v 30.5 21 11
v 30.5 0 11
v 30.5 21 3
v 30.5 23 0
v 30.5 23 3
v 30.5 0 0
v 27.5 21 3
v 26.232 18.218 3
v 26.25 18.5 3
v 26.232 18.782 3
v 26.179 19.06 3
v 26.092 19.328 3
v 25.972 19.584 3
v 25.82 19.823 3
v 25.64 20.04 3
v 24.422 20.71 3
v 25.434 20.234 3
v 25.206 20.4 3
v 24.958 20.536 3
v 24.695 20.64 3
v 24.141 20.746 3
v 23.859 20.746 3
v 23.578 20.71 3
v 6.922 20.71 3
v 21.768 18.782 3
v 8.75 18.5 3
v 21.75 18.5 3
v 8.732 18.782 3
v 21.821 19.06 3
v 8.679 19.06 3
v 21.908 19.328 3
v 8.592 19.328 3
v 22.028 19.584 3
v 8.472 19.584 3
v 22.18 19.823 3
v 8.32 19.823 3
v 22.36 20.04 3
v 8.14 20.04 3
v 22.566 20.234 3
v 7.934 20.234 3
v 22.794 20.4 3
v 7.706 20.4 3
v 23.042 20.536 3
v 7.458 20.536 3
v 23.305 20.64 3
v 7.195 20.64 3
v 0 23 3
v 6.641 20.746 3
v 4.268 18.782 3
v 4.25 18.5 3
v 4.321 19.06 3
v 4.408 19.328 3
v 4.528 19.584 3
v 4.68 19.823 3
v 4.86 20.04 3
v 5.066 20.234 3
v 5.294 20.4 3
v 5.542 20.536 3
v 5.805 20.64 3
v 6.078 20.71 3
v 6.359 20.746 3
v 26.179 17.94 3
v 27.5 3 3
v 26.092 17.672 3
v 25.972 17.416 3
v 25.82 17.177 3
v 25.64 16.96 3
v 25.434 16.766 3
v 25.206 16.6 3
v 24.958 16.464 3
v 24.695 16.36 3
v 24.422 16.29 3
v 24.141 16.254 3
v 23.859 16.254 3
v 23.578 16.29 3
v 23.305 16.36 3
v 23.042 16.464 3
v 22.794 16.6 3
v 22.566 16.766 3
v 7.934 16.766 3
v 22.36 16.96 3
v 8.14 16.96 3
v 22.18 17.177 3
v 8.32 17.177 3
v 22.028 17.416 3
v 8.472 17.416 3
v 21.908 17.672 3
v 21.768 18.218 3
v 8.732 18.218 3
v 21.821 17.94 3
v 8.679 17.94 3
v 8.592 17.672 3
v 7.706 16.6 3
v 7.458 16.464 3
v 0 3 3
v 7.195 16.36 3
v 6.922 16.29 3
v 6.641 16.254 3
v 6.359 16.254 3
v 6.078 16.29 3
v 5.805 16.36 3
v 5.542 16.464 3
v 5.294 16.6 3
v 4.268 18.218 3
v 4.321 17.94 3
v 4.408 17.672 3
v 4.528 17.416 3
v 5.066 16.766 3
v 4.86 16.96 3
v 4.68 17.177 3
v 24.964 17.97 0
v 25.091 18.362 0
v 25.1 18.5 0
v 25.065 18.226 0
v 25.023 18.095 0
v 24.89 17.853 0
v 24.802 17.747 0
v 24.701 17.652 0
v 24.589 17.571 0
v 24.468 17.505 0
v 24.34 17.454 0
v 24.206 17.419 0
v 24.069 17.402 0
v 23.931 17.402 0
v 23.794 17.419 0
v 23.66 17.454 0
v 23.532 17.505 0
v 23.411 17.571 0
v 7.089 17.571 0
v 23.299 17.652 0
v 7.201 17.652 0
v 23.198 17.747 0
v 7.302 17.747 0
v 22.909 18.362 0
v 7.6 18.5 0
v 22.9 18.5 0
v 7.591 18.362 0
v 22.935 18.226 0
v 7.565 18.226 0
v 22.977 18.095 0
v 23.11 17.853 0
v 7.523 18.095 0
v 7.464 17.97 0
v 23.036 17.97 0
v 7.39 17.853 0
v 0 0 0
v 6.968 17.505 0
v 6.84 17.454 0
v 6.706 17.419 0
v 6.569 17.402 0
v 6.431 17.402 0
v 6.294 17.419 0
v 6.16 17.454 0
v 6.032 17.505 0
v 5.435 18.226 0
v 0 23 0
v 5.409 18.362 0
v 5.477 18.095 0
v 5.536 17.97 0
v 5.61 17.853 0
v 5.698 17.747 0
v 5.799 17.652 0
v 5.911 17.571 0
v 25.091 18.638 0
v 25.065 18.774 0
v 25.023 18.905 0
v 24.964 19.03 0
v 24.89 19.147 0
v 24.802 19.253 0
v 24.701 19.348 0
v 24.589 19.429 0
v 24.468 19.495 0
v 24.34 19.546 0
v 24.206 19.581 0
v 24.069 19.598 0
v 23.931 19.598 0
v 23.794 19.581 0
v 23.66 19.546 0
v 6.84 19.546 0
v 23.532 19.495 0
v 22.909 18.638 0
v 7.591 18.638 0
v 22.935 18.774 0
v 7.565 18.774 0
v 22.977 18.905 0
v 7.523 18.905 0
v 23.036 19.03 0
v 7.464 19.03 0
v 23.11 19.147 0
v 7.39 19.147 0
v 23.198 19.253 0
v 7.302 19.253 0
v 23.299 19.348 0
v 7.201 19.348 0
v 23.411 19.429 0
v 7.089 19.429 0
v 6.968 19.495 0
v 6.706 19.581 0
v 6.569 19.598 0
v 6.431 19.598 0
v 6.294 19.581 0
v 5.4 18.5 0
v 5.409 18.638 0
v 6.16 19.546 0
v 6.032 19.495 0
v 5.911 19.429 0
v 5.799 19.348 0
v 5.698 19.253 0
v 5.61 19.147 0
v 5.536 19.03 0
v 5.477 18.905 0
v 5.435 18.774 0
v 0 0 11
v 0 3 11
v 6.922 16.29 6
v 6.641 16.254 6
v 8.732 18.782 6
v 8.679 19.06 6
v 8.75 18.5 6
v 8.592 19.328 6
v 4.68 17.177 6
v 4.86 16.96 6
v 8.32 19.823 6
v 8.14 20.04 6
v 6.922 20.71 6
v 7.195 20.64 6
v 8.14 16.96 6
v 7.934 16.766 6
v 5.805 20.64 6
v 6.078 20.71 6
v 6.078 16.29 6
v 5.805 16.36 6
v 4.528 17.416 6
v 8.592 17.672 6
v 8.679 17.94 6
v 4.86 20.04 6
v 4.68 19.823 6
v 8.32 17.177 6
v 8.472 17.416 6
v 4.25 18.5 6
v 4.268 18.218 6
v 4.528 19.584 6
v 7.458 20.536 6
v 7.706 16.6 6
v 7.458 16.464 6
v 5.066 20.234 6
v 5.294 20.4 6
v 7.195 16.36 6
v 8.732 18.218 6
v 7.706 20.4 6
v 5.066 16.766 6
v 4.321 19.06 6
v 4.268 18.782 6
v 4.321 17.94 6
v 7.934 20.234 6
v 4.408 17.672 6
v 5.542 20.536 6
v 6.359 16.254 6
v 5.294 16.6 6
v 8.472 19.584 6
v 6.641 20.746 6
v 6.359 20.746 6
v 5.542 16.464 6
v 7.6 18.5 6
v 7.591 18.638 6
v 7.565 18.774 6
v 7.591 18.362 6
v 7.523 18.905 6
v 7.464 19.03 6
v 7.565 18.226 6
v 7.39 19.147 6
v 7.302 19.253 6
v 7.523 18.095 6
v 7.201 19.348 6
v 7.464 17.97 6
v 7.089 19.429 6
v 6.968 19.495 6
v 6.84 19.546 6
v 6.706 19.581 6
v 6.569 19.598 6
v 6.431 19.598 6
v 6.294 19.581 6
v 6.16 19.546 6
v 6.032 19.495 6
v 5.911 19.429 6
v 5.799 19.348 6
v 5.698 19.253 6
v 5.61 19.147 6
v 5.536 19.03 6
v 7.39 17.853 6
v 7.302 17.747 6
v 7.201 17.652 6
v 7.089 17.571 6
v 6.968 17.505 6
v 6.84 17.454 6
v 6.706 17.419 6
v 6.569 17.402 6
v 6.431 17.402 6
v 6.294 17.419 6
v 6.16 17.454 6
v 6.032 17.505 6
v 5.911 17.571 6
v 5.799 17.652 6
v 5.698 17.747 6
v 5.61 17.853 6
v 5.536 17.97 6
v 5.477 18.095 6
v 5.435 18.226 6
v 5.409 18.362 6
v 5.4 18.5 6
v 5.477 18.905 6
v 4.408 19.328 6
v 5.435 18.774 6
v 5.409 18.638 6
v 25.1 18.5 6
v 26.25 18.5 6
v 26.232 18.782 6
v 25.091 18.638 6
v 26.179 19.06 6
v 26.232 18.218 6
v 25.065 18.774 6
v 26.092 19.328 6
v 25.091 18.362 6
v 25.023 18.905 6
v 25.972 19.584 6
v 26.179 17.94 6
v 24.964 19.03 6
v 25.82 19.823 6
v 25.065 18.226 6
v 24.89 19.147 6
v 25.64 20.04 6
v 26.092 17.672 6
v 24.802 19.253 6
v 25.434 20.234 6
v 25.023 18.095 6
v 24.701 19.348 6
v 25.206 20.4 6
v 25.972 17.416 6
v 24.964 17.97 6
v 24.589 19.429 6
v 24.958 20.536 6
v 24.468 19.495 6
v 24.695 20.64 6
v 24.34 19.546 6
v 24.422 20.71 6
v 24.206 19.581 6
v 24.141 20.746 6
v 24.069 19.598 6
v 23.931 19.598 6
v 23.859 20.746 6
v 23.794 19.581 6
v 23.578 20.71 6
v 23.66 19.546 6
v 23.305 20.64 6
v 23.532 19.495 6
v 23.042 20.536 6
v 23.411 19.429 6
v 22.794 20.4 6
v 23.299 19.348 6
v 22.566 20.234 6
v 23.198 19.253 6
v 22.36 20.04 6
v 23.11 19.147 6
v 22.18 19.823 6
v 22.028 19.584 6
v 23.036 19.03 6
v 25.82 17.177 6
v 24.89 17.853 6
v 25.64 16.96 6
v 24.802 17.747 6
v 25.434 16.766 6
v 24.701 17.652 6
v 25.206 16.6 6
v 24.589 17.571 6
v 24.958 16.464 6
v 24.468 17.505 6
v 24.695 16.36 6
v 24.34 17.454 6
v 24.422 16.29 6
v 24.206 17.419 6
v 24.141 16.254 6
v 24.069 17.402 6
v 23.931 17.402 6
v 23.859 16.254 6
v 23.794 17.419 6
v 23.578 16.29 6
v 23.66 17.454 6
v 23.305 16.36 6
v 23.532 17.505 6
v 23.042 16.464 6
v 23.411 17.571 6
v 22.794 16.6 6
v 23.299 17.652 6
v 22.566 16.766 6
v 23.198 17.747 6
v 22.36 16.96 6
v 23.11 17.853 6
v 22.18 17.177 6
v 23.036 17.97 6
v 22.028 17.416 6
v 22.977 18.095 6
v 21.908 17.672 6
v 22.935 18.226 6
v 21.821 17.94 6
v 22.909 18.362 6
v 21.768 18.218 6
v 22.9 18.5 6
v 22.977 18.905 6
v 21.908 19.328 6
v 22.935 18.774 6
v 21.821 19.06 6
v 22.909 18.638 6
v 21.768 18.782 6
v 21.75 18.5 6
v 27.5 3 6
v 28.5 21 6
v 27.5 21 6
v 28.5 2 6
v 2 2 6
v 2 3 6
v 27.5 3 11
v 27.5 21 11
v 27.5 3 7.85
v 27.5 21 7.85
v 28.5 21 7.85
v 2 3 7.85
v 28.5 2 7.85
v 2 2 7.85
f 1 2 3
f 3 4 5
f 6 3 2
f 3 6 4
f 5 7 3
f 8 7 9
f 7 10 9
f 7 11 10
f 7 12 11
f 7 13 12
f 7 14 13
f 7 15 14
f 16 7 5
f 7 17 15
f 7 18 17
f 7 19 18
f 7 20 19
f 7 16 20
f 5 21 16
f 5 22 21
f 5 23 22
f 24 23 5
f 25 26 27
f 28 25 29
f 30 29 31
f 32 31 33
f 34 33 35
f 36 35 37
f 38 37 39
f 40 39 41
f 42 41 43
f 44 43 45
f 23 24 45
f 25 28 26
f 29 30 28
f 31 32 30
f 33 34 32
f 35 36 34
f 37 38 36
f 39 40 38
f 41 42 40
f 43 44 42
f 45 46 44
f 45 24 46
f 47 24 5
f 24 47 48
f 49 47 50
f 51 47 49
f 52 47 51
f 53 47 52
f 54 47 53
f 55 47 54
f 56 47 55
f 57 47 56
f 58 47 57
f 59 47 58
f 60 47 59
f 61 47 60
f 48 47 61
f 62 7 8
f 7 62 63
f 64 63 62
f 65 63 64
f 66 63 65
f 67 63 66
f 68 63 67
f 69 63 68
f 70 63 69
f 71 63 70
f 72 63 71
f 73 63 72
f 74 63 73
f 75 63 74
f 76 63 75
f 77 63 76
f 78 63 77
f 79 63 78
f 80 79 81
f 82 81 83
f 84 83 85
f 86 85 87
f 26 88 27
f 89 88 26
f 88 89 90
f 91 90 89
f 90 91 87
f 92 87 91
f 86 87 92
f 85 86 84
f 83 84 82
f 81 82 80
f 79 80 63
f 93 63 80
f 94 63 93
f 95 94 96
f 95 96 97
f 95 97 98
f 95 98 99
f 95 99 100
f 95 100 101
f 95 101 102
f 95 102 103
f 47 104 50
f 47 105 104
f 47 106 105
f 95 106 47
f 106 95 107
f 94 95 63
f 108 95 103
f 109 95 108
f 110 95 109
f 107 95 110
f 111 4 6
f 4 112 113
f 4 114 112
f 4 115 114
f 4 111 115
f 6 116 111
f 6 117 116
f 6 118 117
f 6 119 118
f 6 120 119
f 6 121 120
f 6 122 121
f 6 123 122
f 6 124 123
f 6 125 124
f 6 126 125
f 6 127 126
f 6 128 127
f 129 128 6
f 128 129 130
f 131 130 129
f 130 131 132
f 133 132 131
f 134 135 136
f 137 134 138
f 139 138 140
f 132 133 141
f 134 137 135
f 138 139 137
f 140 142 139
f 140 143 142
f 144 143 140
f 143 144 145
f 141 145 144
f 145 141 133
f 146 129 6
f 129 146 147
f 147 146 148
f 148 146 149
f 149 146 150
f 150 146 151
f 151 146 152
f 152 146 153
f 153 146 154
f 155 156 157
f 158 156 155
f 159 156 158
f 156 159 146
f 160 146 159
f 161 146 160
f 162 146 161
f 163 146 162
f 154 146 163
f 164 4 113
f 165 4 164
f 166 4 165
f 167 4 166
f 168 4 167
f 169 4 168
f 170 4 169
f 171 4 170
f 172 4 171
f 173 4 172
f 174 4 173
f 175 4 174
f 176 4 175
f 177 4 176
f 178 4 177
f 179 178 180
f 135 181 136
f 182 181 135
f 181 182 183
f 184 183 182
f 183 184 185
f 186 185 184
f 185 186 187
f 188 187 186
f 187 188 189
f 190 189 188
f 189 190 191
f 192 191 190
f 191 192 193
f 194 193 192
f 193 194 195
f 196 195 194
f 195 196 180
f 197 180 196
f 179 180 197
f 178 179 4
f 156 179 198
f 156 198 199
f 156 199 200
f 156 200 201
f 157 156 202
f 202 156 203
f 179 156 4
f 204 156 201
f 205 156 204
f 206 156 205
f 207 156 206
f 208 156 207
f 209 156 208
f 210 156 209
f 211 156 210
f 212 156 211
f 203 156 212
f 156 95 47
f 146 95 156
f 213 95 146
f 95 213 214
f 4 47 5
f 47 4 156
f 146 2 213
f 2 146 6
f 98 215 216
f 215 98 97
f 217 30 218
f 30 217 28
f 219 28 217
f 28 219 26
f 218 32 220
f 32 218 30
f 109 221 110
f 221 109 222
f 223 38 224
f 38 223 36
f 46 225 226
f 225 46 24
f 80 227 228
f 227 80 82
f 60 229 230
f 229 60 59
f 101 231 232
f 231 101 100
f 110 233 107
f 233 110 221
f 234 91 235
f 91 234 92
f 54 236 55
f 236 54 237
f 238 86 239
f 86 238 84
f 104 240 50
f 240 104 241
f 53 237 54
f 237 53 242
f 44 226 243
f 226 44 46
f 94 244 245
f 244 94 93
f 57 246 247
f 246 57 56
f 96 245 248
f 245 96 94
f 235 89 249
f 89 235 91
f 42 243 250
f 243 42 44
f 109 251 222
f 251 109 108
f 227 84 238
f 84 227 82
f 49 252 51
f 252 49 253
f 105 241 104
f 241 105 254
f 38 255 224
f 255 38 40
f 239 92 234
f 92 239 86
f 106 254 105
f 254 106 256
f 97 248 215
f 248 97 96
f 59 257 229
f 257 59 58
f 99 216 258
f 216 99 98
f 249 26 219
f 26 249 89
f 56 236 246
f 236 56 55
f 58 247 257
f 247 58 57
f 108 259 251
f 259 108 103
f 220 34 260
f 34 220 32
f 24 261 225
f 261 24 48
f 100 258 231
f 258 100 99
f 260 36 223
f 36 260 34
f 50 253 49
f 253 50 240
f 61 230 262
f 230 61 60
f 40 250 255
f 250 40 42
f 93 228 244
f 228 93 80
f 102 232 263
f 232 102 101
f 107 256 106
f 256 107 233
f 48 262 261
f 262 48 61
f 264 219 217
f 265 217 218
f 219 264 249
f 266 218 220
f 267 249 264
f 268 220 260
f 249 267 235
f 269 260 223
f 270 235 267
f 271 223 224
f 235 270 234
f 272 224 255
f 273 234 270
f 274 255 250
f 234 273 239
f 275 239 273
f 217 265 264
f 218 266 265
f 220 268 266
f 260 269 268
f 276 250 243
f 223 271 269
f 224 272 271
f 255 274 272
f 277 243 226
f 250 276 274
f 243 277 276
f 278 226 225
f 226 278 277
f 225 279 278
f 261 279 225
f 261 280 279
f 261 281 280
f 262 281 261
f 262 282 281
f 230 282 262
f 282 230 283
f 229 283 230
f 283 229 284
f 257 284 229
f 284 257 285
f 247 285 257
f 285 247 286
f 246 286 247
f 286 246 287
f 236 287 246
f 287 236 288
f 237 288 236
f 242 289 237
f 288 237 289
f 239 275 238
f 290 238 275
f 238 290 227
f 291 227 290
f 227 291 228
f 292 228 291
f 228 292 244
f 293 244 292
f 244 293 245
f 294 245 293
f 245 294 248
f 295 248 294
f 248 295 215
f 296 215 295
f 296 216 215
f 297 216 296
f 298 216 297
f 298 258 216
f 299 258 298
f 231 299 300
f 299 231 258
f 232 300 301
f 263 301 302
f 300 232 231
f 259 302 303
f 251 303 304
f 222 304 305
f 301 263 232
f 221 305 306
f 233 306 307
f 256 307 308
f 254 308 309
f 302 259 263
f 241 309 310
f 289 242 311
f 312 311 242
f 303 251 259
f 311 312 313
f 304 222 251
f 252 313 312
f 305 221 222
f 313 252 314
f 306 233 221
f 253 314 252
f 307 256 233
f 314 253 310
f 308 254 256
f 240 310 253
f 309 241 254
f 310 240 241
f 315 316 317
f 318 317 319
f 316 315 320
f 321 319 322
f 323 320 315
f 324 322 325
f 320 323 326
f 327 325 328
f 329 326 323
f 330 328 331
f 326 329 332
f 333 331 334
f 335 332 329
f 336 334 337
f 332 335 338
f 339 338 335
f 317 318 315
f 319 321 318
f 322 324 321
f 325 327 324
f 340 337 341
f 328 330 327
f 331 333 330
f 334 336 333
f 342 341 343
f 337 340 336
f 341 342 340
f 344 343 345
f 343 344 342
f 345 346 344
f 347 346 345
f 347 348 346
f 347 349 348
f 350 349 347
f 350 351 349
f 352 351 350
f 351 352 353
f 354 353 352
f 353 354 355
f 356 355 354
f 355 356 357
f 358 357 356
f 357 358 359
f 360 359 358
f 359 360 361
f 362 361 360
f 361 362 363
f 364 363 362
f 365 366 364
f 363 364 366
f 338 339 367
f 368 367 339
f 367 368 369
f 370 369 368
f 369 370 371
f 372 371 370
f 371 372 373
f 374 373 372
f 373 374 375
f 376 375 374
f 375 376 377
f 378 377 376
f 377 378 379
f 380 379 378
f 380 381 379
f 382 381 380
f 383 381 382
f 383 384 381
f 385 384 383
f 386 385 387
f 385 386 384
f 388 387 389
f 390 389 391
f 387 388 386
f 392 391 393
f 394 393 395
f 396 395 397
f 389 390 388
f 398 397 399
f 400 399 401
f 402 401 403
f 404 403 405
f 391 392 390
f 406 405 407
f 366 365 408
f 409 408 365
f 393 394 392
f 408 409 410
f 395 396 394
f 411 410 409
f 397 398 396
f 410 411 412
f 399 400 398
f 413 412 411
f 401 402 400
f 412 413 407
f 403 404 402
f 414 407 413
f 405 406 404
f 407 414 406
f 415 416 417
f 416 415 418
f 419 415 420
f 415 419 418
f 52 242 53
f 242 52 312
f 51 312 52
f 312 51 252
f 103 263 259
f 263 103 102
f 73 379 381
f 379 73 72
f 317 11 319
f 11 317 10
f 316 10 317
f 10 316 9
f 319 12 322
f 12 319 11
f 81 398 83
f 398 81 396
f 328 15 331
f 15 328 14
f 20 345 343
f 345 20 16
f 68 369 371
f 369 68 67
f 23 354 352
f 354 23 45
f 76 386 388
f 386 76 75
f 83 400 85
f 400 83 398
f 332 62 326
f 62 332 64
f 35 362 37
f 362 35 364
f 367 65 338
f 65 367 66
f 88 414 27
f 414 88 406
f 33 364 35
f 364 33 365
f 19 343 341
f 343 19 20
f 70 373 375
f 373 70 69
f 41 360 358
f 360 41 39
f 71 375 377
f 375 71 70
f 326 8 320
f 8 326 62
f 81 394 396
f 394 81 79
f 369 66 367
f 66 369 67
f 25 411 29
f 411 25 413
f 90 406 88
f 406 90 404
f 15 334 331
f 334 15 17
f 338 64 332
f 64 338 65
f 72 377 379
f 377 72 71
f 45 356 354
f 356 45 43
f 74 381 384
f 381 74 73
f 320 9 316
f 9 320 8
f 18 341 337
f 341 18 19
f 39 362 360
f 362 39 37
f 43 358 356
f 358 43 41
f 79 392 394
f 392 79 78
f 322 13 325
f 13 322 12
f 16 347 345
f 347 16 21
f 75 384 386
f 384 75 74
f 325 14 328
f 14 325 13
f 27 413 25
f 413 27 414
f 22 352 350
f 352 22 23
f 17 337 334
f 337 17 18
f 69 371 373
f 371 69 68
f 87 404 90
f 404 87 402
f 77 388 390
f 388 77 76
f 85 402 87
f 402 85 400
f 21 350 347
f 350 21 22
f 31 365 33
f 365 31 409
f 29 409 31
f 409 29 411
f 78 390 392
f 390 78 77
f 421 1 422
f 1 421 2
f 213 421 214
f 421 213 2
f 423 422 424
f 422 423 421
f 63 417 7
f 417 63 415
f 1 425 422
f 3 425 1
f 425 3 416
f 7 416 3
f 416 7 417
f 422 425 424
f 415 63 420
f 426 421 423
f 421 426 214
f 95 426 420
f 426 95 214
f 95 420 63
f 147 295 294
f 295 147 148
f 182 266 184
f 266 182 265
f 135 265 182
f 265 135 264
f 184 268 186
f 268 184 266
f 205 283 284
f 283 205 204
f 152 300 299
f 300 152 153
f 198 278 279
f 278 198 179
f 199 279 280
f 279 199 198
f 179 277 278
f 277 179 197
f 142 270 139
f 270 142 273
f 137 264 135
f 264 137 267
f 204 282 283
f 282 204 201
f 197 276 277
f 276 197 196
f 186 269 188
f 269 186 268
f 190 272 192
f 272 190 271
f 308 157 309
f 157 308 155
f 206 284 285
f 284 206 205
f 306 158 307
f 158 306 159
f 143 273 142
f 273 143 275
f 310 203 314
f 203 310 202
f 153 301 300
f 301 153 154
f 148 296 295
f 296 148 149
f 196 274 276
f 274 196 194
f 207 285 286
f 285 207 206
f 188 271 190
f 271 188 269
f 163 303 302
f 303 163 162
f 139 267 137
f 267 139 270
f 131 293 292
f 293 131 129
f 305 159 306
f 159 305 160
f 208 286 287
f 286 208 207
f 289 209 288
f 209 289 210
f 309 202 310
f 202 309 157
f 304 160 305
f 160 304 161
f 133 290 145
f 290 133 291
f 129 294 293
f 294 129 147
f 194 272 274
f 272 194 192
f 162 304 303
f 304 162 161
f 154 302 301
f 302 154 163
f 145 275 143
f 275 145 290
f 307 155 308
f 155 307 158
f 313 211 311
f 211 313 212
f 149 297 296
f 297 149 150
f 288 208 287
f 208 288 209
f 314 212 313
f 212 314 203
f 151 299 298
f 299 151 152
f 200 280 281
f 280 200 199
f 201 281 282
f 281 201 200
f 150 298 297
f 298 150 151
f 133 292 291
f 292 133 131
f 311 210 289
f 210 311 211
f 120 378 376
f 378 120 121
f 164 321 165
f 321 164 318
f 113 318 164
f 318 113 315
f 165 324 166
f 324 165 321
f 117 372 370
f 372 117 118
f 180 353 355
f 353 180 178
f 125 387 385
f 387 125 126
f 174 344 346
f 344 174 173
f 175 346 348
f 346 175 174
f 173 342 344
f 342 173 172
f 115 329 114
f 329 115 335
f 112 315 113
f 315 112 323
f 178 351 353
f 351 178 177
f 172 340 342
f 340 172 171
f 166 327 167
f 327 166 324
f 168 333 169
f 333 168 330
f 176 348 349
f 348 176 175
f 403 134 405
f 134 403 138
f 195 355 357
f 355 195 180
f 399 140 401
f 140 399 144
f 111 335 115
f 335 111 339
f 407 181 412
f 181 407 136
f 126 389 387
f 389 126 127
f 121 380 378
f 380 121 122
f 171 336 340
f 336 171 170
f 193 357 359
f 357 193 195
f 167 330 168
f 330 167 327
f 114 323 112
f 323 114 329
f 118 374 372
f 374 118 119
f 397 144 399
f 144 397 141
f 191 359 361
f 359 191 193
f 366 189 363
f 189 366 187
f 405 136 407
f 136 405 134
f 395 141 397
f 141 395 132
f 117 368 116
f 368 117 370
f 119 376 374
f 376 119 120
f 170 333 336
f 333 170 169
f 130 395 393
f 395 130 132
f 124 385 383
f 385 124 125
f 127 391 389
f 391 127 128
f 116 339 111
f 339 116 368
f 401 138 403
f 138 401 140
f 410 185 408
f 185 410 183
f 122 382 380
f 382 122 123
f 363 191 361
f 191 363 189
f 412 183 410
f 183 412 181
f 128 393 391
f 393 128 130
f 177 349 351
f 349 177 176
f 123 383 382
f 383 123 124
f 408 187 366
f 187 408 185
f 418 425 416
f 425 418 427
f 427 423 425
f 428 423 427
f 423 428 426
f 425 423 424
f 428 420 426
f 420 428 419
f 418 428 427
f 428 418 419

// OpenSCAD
// KY-040 Rotary Encoder Module Model
// All measurements in millimeters
$fn = 50; // Resolution for circles

module ky040() {
    // PCB dimensions
    pcb_width = 26.5;
    pcb_depth = 19;
    pcb_thickness = 1.6;
    
    // PCB with mounting holes
    difference() {
        // Main PCB body
        color("green", 0.9)
        cube([pcb_width, pcb_depth, pcb_thickness]);
        
        // Mounting holes (2.5mm diameter)
        hole_diameter = 2.5;
        hole_offset_x = 2.5;
        hole_offset_y = 2.5;
        
        translate([hole_offset_x, hole_offset_y, -0.5])
            cylinder(h = pcb_thickness + 1, d = hole_diameter);
        
        translate([pcb_width - hole_offset_x, hole_offset_y, -0.5])
            cylinder(h = pcb_thickness + 1, d = hole_diameter);
    }
    
    // Rotary encoder body
    encoder_x = pcb_width / 2;
    encoder_y = pcb_depth / 2 + 1;
    
    translate([encoder_x, encoder_y, pcb_thickness]) {
        // Cubic base
        color("silver", 0.8)
        translate([-6.25, -6.25, 0])
            cube([12.5, 12.5, 7]);
        
        // Encoder shaft
        color("silver", 0.9)
        translate([0, 0, 7])
            cylinder(h = 15, d = 6);
        
        // Shaft flat (D-shaft)
        color("silver", 0.9)
        translate([0, 0, 7])
            difference() {
                cylinder(h = 15, d = 6);
                translate([2.5, -3, -0.5])
                    cube([2, 6, 16]);
            }
        
        // Threaded bushing
        color("silver", 0.7)
        translate([0, 0, -2])
            cylinder(h = 2, d = 7);
    }
    
    // Pin headers (5 pins)
    pin_spacing = 2.54;
    pin_start_y = (pcb_depth - (4 * pin_spacing)) / 2;
    pin_x = pcb_width - 2;
    
    for (i = [0:4]) {
        translate([pin_x, pin_start_y + i * pin_spacing, -2.5]) {
            // Pin below PCB
            color("gold", 0.9)
            cylinder(h = 2.5, d = 0.6);
            
            // Pin above PCB
            translate([0, 0, 2.5])
            color("black", 0.9)
            cube([2.5, pin_spacing * 0.8, pcb_thickness], center = true);
        }
    }
    
    // Small components on PCB (resistors/capacitors)
    for (i = [0:2]) {
        translate([7 + i * 4, 14, pcb_thickness]) {
            color("black", 0.8)
            cube([3, 1.5, 1.2]);
        }
    }
}

module knob() {
    color("black", 0.9) {
        cylinder(h = 10, d = 15);
        translate([0, 0, 10])
            cylinder(h = 3, d1 = 15, d2 = 13);
        // Indicator line
        translate([0, 5, 10])
            color("white")
            cube([1, 2, 3.5], center = true);
    }
}

module Ky040Mount(showpin = true, showMount = false) {
    // PCB dimensions
    pcb_width = 26.5;
    pcb_depth = 19;
    pcb_thickness = 1.6;
    
    // Mount parameters
    base_thickness = 3;
    wall_height = 8;
    wall_thickness = 2;
    clearance = 0.3; // For easier fitting
    
    // Mounting post parameters
    post_height = 3;
    post_outer_diameter = 4.5;
    post_inner_diameter = 2.2; // Slightly smaller than 2.5mm hole for press fit
    
    // Mounting hole positions
    hole_offset_x = 4.5;
    hole_offset_y = 16.5;
    
    
    difference() {
    difference() {
        union() {
            // Base plate
            color("lightblue", 0.8)
            cube([pcb_width + wall_thickness * 2, 
                  pcb_depth + wall_thickness * 2, 
                  base_thickness]);
            
            // Mounting posts
            translate([wall_thickness + hole_offset_x, 
                      wall_thickness + hole_offset_y, 
                      base_thickness]) {
                color("lightblue", 0.8)
                cylinder(h = post_height, d = post_outer_diameter);
            }
            
            translate([wall_thickness + pcb_width - hole_offset_x, 
                      wall_thickness + hole_offset_y, 
                      base_thickness]) {
                color("lightblue", 0.8)
                cylinder(h = post_height, d = post_outer_diameter);
            }
            
            // Right wall 
            translate([pcb_width + wall_thickness -1, wall_thickness, 0])
                color("lightblue", 0.8)
                cube([wall_thickness + 1, pcb_depth, base_thickness + wall_height]);

            
            // Bottom wall (where pins are NOT located)
            translate([0, 0, 0])
                color("lightblue", 0.8)
                cube([pcb_width + wall_thickness * 2, wall_thickness+ 1, base_thickness + wall_height]);
        }
        
        // Screw holes in mounting posts (optional for M2 screws)
        translate([wall_thickness + hole_offset_x, 
                  wall_thickness + hole_offset_y, 
                  -0.5]) {
            cylinder(h = base_thickness + post_height + 1, d = post_inner_diameter);
        }
        
        translate([wall_thickness + pcb_width - hole_offset_x, 
                  wall_thickness + hole_offset_y, 
                  -0.5]) {
            cylinder(h = base_thickness + post_height + 1, d = post_inner_diameter);
                      
        }
    }
    translate([wall_thickness, wall_thickness, base_thickness + post_height]){
    cube([pcb_width,pcb_depth + 1,pcb_thickness + 0.25]);
    }
    }
}
   



// Render the mount
Ky040Mount();


//display mounting pins
//mountingPins();

// Render the KY-040 module positioned on the mount
//translate([26.5+2, 20, 6])
//    rotate([0,0,180]){
//    ky040();
//    }

// Add knob for visualization
//translate([15.25, 12.5, 30.6])
//    knob();
